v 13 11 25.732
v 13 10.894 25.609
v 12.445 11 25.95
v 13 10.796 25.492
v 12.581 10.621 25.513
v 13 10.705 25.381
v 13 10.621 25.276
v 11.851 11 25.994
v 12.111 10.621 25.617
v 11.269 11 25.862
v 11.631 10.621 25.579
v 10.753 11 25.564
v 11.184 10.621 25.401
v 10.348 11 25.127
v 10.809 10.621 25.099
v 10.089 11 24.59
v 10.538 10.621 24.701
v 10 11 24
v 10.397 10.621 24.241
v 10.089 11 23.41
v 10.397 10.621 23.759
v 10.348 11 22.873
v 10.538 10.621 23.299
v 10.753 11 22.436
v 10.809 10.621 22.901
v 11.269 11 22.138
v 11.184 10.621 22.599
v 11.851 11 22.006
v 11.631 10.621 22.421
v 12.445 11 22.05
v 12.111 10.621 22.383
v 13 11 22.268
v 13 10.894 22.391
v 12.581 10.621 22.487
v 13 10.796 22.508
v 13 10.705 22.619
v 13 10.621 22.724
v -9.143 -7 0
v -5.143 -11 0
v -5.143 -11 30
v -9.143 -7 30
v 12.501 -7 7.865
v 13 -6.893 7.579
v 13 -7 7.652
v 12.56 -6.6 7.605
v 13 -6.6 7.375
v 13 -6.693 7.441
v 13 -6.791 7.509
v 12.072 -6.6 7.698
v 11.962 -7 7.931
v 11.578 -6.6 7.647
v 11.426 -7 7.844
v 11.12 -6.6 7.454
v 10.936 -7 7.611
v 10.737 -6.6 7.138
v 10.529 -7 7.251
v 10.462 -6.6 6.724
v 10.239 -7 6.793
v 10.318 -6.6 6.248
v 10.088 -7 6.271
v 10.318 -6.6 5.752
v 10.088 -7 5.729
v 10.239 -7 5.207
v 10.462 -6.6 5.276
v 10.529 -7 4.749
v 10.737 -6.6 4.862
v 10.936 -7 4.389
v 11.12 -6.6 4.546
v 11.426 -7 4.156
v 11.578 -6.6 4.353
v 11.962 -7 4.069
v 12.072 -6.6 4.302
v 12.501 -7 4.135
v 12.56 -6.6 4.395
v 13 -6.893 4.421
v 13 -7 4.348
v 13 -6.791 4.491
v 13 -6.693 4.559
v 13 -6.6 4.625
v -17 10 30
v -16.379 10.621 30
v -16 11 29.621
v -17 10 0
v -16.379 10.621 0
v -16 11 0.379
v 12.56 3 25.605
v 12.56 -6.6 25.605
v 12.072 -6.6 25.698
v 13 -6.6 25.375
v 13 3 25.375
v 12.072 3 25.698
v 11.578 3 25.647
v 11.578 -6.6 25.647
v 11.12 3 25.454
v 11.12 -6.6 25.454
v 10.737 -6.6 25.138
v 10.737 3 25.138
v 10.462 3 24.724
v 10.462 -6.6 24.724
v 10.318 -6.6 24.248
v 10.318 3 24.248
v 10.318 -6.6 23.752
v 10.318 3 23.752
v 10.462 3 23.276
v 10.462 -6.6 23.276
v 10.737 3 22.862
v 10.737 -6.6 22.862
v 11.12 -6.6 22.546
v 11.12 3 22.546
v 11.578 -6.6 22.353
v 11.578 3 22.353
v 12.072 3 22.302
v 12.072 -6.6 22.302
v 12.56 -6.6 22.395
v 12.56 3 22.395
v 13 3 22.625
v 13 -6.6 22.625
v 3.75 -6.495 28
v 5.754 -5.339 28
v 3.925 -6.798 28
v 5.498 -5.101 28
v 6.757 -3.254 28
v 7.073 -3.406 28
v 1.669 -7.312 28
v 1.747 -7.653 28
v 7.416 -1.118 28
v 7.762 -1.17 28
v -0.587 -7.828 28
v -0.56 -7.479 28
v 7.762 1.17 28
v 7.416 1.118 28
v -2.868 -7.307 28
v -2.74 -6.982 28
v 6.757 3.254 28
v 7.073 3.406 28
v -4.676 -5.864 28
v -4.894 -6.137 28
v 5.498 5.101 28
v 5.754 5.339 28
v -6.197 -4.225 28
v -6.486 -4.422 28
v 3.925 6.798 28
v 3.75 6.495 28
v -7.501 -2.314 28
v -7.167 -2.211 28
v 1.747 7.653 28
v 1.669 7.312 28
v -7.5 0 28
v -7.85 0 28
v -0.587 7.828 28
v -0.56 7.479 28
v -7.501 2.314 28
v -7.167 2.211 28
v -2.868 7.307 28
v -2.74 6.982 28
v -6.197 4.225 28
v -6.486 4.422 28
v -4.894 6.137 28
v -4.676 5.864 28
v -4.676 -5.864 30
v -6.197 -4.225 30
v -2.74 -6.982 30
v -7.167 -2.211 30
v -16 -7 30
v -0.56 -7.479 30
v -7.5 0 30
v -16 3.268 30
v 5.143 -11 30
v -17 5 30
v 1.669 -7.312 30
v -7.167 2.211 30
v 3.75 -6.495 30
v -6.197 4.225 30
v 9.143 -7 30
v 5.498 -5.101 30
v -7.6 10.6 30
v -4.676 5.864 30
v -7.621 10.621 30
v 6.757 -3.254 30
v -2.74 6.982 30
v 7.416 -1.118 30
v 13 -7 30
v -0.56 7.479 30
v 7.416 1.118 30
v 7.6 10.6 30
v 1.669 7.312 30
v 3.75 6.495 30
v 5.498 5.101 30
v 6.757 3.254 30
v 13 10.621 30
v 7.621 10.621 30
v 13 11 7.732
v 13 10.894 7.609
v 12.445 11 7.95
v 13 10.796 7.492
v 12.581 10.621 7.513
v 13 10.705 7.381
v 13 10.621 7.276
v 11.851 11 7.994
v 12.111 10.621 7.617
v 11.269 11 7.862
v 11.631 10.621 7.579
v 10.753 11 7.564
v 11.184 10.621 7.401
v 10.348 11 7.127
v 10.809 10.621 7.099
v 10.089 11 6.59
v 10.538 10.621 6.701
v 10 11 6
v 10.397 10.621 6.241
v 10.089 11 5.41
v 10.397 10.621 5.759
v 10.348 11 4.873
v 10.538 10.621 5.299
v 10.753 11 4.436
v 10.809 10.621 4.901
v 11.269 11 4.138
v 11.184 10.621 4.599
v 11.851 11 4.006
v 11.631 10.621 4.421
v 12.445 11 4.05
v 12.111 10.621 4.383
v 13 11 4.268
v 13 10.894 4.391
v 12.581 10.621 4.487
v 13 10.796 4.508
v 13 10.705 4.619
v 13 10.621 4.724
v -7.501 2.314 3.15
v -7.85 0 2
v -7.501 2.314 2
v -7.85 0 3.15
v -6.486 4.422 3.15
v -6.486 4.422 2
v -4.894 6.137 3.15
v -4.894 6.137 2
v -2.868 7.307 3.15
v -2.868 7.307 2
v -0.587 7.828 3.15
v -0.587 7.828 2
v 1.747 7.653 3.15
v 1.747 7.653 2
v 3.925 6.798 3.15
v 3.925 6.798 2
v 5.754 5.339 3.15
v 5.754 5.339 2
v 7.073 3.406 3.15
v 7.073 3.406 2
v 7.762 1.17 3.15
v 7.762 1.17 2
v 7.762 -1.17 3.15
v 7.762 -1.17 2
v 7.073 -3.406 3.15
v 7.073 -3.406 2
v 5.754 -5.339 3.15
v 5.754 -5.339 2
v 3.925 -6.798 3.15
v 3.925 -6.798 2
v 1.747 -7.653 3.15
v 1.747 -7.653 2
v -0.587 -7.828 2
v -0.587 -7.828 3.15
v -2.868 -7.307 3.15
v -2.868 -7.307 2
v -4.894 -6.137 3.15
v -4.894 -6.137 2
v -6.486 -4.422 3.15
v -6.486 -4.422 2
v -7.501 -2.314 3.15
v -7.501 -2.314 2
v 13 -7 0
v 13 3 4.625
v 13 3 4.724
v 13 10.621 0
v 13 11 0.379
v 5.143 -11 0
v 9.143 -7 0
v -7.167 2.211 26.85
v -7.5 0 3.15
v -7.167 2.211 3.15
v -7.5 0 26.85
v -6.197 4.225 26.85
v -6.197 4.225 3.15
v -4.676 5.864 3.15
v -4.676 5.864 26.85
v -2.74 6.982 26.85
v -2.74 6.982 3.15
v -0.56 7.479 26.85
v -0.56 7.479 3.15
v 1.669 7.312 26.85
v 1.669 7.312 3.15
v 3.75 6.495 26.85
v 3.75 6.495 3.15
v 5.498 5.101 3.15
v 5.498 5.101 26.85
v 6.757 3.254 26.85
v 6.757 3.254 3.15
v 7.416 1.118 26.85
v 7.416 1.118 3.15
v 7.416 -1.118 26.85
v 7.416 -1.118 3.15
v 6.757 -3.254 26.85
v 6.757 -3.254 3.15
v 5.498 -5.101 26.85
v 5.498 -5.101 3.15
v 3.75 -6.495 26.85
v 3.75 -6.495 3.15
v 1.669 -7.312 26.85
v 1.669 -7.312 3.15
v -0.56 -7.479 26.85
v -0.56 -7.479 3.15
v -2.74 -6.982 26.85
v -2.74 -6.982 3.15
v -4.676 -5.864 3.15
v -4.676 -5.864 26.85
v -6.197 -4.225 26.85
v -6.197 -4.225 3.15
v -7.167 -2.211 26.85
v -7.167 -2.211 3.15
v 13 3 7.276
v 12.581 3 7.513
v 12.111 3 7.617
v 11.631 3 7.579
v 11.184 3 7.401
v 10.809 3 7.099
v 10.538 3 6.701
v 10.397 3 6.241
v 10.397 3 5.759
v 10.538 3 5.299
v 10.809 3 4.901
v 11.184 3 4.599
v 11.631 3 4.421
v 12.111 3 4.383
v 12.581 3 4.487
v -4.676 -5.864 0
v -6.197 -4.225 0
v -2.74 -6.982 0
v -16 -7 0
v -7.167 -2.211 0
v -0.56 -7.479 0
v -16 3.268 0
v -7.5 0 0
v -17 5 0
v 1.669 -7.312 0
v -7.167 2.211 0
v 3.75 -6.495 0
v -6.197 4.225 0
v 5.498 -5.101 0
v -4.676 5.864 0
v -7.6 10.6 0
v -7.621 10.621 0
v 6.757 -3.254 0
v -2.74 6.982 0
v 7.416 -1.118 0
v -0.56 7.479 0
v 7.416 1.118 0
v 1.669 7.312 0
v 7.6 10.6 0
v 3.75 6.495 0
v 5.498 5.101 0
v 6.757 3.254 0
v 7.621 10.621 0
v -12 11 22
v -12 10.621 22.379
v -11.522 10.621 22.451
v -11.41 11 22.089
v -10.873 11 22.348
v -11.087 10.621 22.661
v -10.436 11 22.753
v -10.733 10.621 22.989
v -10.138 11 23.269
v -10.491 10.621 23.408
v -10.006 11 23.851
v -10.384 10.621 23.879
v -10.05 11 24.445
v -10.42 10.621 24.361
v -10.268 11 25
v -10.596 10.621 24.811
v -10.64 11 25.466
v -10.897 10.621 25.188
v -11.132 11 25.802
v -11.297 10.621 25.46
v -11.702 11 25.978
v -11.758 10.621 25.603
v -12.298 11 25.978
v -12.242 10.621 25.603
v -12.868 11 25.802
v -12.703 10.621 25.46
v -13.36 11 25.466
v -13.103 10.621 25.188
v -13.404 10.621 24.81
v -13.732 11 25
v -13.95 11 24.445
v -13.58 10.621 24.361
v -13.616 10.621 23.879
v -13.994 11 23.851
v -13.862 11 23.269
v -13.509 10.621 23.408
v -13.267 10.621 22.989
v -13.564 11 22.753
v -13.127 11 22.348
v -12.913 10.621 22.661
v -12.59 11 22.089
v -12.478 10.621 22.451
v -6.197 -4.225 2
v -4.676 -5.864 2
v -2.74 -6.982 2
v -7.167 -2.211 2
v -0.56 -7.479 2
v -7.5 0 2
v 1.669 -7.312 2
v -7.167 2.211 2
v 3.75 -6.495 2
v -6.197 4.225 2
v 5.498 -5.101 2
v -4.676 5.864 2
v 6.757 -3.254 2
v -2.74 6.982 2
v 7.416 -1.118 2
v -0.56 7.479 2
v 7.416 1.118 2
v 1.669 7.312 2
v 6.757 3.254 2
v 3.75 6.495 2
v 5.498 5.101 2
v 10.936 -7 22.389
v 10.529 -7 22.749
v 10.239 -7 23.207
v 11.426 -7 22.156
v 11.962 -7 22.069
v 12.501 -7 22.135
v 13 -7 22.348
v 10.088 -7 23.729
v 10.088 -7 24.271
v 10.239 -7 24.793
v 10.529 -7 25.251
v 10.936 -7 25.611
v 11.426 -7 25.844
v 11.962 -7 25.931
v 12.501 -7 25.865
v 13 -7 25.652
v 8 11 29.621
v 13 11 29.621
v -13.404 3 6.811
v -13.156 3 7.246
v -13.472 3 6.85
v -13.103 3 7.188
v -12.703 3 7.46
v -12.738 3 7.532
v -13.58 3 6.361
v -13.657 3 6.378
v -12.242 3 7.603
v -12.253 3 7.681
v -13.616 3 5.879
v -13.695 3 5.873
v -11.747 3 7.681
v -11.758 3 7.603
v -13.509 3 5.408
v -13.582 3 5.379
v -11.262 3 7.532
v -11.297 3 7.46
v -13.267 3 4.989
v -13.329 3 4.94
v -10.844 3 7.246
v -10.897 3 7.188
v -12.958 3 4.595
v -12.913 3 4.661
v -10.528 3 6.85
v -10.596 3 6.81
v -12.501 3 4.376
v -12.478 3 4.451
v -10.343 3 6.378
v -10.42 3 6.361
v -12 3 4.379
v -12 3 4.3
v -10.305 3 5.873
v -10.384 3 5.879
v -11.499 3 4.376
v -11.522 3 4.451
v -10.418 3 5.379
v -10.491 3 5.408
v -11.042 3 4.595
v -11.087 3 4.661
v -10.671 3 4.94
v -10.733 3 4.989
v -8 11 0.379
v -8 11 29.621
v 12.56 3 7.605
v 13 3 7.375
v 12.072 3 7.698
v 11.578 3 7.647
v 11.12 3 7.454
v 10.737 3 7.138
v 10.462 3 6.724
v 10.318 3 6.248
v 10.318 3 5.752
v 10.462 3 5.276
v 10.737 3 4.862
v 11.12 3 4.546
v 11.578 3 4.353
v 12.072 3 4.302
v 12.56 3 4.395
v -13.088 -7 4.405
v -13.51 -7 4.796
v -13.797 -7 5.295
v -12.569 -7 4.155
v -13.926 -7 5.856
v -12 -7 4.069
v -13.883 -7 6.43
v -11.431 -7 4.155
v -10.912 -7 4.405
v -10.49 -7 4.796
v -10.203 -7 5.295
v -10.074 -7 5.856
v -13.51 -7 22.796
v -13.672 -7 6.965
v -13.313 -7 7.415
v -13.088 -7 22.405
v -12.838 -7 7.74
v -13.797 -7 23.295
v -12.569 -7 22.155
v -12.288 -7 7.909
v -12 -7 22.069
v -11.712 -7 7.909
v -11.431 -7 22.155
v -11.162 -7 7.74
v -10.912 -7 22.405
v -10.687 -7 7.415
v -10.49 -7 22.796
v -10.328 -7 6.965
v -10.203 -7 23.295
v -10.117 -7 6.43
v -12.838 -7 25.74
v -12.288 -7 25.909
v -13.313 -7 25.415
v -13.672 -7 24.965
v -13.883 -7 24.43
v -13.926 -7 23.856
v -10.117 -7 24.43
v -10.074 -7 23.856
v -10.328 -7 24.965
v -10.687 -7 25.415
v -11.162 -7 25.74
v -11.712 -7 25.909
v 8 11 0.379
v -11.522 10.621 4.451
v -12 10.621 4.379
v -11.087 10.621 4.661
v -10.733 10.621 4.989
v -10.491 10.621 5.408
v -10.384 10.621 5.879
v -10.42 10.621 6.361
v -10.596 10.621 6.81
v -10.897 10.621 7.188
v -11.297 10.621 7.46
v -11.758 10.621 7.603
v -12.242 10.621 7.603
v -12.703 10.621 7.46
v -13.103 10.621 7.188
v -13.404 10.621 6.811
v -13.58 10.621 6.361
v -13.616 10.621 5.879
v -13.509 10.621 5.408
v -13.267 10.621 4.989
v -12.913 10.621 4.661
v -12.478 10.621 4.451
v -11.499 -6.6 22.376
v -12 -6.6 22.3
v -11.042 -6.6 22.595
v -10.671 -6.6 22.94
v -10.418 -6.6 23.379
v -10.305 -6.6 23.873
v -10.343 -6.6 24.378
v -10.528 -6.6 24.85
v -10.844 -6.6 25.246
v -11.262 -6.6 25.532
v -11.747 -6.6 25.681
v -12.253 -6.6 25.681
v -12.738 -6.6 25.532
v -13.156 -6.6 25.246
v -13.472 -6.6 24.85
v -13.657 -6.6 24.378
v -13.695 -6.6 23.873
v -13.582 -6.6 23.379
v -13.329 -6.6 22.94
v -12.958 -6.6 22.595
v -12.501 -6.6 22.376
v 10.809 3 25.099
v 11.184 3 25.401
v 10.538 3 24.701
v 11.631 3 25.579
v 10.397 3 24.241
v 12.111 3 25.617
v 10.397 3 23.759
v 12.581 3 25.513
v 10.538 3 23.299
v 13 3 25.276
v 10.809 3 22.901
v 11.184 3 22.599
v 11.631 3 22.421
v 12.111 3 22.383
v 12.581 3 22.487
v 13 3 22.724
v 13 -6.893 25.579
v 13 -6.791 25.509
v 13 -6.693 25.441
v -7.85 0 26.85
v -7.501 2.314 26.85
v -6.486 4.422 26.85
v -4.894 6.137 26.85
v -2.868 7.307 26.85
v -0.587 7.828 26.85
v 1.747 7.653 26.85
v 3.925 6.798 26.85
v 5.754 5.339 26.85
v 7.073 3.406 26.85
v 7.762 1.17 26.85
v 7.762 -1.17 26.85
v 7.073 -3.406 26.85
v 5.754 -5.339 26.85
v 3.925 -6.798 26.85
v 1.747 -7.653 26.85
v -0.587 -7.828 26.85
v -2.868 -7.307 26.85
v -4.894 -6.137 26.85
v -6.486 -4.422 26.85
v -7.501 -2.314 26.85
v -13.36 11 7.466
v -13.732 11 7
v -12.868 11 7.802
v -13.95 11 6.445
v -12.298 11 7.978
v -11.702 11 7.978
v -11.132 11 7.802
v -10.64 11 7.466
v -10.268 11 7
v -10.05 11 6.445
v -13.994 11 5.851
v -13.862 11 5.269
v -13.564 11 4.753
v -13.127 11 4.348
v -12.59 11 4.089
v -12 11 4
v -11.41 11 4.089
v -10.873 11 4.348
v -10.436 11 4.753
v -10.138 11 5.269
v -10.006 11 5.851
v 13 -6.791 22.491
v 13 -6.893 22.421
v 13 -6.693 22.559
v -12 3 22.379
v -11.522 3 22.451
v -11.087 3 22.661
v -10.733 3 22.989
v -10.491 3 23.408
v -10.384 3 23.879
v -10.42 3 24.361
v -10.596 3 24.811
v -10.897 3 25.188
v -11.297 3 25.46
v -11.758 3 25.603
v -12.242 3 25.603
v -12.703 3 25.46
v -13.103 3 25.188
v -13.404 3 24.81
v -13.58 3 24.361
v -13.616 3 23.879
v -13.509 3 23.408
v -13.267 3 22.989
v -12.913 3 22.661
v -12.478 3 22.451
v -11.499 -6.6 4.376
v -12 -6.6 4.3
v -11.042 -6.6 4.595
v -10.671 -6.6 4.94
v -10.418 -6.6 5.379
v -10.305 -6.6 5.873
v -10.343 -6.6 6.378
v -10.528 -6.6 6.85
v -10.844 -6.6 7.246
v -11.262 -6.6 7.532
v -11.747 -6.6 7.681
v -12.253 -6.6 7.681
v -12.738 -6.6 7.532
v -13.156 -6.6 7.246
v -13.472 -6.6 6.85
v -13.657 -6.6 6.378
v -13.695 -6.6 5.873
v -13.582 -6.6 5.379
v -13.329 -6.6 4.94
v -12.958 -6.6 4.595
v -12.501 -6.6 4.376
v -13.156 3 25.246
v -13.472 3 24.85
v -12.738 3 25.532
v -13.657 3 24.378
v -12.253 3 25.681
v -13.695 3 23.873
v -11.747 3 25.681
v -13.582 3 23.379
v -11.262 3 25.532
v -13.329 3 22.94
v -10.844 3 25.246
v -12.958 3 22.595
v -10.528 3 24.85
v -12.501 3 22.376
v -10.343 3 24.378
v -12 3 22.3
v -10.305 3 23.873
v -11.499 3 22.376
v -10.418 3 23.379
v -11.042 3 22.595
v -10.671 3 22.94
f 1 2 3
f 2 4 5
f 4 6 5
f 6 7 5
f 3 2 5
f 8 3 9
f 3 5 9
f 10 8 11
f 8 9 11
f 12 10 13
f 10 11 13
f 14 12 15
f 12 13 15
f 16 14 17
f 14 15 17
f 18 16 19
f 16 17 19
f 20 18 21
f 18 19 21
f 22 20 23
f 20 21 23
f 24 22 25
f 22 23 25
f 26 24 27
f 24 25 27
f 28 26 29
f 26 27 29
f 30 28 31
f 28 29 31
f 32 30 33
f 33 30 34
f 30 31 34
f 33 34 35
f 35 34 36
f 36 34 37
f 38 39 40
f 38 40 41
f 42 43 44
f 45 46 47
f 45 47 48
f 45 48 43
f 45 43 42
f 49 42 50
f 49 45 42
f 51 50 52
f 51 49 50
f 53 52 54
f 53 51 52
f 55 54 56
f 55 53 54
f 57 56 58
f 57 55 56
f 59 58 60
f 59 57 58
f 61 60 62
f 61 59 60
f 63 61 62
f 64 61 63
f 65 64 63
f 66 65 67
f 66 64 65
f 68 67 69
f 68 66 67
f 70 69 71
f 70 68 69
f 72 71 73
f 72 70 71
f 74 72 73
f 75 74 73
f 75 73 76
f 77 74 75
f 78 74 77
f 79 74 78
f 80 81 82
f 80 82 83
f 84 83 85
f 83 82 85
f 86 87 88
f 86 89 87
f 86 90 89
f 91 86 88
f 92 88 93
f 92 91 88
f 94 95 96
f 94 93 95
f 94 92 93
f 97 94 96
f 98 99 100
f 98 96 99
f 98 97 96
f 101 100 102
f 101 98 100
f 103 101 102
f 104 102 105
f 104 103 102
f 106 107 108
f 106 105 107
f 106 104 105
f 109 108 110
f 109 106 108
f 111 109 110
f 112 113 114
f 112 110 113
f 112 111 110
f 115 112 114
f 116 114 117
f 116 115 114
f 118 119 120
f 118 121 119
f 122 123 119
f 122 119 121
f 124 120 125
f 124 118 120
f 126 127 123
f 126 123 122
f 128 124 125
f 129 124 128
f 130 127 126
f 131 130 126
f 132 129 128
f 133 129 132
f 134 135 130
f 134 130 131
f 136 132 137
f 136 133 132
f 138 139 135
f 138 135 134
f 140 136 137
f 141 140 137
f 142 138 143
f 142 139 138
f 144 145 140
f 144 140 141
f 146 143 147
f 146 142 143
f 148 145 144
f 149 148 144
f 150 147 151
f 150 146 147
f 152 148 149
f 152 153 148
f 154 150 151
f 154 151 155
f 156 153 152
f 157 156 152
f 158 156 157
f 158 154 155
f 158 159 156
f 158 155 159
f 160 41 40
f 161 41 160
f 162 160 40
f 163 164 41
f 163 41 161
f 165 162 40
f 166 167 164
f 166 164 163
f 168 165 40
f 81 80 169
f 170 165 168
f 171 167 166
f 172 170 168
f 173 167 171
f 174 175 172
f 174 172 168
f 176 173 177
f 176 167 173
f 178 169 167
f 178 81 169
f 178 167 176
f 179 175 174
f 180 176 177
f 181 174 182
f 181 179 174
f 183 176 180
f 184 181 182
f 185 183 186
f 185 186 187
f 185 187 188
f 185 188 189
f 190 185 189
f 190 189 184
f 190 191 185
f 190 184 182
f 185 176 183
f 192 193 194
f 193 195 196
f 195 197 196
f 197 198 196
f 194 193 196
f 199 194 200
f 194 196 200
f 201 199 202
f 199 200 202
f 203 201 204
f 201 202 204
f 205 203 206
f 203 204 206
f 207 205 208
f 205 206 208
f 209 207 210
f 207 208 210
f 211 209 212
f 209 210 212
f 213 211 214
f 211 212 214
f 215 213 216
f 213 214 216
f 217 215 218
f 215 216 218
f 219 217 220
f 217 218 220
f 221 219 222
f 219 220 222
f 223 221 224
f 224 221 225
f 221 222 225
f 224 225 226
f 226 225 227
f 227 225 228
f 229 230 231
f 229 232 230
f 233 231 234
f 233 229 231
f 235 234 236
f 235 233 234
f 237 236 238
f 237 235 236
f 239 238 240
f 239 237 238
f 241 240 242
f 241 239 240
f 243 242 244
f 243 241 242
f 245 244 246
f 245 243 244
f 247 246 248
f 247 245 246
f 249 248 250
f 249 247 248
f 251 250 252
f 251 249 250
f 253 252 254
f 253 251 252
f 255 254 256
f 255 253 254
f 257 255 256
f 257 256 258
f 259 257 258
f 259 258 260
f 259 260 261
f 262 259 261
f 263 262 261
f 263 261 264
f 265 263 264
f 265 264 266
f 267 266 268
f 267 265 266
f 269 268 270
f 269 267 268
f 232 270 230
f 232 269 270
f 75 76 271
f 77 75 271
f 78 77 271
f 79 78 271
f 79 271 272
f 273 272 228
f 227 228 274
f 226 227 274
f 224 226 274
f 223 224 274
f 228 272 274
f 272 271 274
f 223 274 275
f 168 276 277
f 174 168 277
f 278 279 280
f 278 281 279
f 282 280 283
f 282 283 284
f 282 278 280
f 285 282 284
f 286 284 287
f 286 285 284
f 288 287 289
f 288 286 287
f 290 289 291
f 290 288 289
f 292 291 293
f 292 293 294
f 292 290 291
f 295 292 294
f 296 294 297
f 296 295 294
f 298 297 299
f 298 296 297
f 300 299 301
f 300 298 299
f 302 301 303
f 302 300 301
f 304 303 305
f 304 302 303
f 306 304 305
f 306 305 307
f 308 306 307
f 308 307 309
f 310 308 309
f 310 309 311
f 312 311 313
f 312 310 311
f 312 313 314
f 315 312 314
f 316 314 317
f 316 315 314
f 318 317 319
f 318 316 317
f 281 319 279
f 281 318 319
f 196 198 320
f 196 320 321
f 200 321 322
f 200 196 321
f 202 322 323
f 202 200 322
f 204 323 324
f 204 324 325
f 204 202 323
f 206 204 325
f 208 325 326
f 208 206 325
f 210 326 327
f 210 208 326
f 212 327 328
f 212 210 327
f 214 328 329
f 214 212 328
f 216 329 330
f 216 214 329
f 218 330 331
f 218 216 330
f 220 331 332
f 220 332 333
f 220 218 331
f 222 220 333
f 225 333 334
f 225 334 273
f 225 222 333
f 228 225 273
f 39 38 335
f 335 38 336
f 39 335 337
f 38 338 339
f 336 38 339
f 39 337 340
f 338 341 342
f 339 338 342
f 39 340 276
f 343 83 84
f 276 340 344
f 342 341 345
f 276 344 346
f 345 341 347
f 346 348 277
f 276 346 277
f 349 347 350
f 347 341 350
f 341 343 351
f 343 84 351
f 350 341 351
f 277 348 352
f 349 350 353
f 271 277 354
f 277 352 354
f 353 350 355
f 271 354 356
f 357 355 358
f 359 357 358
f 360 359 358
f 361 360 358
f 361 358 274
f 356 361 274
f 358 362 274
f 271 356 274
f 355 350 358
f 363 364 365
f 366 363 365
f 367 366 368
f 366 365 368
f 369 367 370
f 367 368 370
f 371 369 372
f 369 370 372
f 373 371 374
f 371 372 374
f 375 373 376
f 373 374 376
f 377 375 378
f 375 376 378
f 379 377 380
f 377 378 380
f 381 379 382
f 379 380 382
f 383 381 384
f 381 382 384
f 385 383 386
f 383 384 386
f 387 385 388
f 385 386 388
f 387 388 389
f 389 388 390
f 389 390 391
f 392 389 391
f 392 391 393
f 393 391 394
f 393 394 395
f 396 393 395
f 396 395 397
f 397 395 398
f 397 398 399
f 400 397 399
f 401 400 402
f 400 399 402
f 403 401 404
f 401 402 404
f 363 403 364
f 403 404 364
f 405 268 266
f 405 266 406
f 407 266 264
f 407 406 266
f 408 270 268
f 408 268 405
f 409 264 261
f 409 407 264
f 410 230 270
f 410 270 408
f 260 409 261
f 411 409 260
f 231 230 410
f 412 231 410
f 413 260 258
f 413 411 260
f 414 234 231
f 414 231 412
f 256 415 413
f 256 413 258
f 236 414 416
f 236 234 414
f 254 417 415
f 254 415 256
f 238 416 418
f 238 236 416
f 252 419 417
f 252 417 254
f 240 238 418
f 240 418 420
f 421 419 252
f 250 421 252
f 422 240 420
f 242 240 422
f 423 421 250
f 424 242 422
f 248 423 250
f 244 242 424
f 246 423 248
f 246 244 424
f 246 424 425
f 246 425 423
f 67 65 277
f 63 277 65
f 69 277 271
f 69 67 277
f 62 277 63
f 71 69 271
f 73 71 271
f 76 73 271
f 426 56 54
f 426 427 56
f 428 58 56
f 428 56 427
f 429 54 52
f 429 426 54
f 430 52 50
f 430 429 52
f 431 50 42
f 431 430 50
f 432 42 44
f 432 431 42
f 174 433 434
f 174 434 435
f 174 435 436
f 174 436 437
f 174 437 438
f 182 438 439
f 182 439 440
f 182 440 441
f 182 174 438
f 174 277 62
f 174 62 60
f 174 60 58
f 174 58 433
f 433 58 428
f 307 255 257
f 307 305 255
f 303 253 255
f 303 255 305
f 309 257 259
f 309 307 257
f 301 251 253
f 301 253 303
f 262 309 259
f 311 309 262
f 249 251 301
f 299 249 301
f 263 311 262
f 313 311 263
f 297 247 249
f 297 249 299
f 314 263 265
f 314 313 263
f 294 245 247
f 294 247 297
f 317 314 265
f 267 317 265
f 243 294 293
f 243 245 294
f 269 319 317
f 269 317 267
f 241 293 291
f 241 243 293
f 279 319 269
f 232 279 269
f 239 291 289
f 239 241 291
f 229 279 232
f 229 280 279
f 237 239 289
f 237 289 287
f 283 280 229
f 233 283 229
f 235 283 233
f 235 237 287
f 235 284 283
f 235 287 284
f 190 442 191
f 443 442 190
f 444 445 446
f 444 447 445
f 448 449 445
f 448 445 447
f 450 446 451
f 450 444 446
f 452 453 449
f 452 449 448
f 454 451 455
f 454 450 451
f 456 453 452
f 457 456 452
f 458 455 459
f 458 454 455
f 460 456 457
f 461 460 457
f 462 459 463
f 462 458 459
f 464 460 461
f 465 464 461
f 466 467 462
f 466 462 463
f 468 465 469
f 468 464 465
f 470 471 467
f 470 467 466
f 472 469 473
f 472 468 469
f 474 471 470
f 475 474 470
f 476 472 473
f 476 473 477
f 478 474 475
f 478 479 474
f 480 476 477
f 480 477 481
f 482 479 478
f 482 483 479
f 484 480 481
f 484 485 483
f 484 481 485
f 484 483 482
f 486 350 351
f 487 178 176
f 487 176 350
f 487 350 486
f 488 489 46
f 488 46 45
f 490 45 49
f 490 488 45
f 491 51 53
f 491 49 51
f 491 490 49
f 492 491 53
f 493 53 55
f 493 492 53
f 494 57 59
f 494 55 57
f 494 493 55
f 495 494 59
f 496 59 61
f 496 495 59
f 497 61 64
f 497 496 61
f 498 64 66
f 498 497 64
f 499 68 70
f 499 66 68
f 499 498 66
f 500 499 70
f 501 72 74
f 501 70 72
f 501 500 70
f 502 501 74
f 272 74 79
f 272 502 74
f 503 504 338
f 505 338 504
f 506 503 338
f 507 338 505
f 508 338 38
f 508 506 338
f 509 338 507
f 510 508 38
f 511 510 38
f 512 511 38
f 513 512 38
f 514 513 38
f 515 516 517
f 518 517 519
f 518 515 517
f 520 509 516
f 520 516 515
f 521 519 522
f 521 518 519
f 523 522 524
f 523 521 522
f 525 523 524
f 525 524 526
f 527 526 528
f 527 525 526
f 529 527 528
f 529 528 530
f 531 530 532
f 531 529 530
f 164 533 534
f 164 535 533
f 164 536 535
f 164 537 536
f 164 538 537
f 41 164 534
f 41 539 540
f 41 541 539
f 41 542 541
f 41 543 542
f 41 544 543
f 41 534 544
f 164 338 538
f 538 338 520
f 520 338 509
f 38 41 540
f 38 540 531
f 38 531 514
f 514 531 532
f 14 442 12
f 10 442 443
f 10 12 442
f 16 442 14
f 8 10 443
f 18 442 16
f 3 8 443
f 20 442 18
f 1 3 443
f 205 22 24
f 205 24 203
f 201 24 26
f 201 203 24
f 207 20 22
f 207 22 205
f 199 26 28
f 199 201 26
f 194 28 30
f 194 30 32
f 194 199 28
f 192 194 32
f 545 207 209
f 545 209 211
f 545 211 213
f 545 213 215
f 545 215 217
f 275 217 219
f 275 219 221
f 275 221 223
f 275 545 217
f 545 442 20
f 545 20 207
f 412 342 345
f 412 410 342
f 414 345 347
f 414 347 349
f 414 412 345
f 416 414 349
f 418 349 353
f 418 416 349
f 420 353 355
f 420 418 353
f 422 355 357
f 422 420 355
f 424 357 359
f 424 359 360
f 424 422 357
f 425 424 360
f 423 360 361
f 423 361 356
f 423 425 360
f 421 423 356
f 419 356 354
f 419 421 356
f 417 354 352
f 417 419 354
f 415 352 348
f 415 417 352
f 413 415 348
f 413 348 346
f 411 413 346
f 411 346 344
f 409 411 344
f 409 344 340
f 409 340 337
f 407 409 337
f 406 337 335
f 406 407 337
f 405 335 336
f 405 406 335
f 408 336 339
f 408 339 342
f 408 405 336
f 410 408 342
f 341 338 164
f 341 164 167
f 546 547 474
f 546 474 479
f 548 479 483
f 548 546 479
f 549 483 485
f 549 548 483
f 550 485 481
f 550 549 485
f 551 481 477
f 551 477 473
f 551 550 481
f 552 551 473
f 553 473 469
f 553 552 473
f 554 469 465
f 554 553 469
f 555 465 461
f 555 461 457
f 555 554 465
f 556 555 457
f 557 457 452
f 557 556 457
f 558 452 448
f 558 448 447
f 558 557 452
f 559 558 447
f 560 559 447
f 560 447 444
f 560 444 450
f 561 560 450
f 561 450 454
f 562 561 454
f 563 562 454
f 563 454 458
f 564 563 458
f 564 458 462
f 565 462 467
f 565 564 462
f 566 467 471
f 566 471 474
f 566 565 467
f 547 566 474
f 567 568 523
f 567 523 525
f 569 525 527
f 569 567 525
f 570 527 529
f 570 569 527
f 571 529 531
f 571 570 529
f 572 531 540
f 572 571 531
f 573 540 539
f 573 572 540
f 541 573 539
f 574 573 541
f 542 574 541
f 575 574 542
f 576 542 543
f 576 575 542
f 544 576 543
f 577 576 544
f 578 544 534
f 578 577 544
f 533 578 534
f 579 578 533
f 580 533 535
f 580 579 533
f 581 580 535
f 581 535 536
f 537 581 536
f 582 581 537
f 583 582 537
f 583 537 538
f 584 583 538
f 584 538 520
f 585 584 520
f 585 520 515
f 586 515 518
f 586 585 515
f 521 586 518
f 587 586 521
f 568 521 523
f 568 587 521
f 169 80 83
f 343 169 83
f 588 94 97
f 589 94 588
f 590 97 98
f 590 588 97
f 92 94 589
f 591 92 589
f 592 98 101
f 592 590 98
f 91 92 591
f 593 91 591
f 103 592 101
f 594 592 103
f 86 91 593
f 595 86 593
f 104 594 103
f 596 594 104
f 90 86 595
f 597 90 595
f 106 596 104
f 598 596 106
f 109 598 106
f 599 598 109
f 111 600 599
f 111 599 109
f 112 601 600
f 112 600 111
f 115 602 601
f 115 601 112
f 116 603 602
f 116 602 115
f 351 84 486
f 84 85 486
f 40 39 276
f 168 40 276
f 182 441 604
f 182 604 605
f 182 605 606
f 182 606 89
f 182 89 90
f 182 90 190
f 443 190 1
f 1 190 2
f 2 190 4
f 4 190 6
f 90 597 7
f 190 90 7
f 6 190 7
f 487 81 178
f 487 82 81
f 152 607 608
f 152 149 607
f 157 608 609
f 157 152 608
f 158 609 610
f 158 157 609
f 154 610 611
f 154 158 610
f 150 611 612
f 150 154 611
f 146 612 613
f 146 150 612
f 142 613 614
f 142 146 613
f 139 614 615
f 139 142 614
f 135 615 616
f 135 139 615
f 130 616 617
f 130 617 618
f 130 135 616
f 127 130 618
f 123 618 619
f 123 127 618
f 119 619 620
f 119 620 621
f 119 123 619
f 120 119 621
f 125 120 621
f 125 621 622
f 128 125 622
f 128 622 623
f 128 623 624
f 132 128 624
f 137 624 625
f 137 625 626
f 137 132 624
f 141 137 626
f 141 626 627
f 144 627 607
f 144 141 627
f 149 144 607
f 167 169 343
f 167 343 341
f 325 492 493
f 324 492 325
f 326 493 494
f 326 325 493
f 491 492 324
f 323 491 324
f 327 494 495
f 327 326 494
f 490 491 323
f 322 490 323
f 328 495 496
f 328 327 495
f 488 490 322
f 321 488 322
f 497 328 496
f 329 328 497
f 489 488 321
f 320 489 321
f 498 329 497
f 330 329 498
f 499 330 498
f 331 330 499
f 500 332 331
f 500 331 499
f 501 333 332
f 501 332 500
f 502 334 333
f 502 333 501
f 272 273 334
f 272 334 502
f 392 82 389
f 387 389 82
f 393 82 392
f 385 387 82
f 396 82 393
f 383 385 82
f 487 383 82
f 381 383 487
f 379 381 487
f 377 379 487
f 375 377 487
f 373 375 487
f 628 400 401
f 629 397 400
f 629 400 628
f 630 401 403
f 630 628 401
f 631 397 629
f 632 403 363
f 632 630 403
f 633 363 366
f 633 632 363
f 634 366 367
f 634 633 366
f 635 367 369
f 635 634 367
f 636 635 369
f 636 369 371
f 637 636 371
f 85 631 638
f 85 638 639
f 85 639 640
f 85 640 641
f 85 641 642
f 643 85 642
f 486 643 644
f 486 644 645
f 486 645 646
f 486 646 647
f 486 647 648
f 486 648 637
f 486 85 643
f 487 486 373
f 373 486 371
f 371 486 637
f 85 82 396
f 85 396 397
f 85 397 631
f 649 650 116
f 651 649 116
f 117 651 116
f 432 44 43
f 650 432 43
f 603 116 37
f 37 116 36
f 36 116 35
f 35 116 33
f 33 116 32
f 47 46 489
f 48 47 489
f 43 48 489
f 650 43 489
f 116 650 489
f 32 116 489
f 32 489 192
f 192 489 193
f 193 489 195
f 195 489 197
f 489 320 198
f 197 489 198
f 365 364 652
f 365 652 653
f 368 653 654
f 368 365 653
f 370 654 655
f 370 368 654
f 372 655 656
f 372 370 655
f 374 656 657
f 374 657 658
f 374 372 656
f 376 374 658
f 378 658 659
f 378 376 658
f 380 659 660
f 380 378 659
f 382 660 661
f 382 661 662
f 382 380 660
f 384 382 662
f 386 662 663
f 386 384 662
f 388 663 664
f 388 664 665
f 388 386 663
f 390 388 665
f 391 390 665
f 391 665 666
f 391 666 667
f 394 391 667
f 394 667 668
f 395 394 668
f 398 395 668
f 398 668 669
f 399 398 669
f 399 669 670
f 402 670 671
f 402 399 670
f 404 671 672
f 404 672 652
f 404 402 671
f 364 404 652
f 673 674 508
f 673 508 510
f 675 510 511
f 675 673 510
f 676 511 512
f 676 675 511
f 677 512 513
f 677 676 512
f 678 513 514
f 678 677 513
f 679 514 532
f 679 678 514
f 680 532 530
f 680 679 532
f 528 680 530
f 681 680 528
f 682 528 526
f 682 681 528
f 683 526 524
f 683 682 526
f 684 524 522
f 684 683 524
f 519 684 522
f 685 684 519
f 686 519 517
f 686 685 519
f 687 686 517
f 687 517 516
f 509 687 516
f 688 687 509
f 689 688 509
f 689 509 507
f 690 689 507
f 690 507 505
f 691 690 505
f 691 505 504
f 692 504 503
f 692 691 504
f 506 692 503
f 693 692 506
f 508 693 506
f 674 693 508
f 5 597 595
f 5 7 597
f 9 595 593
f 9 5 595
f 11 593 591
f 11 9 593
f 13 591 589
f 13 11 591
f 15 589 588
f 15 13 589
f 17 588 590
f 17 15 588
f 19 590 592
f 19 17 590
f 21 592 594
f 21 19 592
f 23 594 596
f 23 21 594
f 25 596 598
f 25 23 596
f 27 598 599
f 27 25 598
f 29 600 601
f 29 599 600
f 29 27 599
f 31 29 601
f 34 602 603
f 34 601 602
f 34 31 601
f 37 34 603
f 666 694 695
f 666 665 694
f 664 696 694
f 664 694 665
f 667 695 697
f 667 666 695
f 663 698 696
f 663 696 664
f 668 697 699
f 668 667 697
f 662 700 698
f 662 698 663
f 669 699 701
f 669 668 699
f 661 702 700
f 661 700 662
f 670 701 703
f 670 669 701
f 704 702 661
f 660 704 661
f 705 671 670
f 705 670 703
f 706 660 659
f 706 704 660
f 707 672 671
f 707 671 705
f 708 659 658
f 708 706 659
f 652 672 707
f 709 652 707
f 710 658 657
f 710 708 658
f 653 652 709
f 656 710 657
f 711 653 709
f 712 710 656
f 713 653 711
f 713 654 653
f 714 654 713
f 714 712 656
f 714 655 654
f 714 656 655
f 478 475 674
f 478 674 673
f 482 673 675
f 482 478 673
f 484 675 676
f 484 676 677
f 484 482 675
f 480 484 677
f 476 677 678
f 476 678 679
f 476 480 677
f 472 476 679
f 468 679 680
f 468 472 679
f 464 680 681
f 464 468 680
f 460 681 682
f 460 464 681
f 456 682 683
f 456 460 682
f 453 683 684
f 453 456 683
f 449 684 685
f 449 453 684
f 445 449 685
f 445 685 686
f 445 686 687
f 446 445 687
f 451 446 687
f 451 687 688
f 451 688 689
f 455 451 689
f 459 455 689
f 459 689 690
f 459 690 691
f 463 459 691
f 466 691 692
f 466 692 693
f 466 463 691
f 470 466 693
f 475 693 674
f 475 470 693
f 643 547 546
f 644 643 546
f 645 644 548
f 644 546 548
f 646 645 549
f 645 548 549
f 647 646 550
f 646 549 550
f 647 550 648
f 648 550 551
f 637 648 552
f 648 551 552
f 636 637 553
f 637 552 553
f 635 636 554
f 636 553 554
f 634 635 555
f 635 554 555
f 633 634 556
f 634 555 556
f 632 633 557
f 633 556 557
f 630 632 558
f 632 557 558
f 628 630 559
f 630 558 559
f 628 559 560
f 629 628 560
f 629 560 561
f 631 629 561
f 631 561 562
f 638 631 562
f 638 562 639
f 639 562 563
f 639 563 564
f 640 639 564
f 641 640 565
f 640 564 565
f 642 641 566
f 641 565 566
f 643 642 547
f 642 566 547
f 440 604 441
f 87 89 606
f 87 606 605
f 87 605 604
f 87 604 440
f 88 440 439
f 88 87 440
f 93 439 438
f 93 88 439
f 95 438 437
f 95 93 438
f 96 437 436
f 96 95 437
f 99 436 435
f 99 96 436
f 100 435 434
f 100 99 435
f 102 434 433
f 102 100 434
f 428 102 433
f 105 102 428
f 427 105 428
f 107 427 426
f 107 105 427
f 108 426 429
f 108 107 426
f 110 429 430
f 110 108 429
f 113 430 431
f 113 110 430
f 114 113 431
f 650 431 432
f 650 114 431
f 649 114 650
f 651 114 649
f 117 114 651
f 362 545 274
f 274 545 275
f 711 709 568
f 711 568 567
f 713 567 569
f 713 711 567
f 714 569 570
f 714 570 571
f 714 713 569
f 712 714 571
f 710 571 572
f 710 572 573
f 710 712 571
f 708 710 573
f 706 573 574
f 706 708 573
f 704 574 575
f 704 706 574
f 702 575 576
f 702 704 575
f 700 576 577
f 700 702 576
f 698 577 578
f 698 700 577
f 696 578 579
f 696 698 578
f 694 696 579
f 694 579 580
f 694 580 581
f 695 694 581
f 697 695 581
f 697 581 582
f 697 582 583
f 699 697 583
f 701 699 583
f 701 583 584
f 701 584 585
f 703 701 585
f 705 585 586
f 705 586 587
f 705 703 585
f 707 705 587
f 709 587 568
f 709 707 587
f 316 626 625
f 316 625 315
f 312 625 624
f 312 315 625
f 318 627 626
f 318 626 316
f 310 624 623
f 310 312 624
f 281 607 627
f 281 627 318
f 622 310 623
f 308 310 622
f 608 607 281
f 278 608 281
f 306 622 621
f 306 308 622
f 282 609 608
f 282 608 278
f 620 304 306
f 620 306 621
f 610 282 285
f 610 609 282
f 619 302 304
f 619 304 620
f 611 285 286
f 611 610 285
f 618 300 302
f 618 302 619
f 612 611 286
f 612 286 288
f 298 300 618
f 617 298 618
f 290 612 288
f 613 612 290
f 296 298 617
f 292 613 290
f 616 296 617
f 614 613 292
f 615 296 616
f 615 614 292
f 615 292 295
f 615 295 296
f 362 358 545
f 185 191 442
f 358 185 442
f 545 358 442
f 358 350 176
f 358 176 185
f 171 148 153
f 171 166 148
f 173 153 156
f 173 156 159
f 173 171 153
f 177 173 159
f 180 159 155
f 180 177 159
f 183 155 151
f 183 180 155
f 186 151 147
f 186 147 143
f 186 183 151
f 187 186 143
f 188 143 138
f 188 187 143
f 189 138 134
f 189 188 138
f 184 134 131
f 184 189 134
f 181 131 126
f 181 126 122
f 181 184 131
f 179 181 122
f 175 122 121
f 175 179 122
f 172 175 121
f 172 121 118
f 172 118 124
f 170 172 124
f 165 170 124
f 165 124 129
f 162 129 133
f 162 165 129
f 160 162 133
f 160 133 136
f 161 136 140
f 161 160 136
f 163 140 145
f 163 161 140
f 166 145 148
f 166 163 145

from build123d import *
from OCP.BRepFilletAPI import BRepFilletAPI_MakeChamfer

# Parameters (mm, degrees)
SCHIZZO1_W                   = 34
SCHIZZO1_H                   = 30
ESTRUSIONE_ESTRUSIONE1_DEPTH = 22
SCHIZZO2_W                   = 1
SCHIZZO2_H                   = 14.267949192
TAGLIO_ESTRUSIONE1_DEPTH     = 37.193922142
SCHIZZO3_W                   = 10.8571
SCHIZZO3_H                   = 4
TAGLIO_ESTRUSIONE2_DEPTH     = 37.193922142
SCHIZZO4_W                   = 11.8571
SCHIZZO4_H                   = 4
TAGLIO_ESTRUSIONE3_DEPTH     = 37.193922142
SCHIZZO5_W                   = 1
SCHIZZO5_H                   = 10.267949192
TAGLIO_ESTRUSIONE4_DEPTH     = 37.193922142
SCHIZZO6_W                   = 15.2
SCHIZZO6_H                   = 0.4
TAGLIO_ESTRUSIONE5_DEPTH     = 37.193922142
SFORMO1_ANGLE                = 60
SFORMO2_ANGLE                = 60
SFORMO3_ANGLE                = 45
SFORMO4_ANGLE                = 45
SMUSSO1_SIZE                 = 0.230940108
SMUSSO1_SIZE2                = 0.4
SMUSSO2_SIZE                 = 0.379
SMUSSO3_SIZE                 = 1
SCHIZZO13_W                  = 7.577824215
SCHIZZO13_H                  = 21.931685432
TAGLIO_ESTRUSIONE6_DEPTH     = 37.193922142


with BuildPart() as part:
    # Schizzo1 → Estrusione-Estrusione1 (new body)
    with BuildSketch(Plane(origin=(0, 11, 0), x_dir=(1, 0, 0), z_dir=(0, 1, 0))):
        with Locations((0, -15)):
            Rectangle(SCHIZZO1_W, SCHIZZO1_H)
    extrude(amount=-ESTRUSIONE_ESTRUSIONE1_DEPTH)

    # Schizzo2 → Taglio-Estrusione1 (cut, through all)
    with BuildSketch(Plane.XY.offset(30)):
        with Locations((16.5, -3.866025404)):
            Rectangle(SCHIZZO2_W, SCHIZZO2_H)
    extrude(amount=-TAGLIO_ESTRUSIONE1_DEPTH, mode=Mode.SUBTRACT)

    # Schizzo3 → Taglio-Estrusione2 (cut, through all)
    with BuildSketch(Plane.XY.offset(30)):
        with Locations((10.57145, -9)):
            Rectangle(SCHIZZO3_W, SCHIZZO3_H)
    extrude(amount=-TAGLIO_ESTRUSIONE2_DEPTH, mode=Mode.SUBTRACT)

    # Schizzo4 → Taglio-Estrusione3 (cut, through all)
    with BuildSketch(Plane.XY.offset(30)):
        with Locations((-11.07145, -9)):
            Rectangle(SCHIZZO4_W, SCHIZZO4_H)
    extrude(amount=-TAGLIO_ESTRUSIONE3_DEPTH, mode=Mode.SUBTRACT)

    # Schizzo5 → Taglio-Estrusione4 (cut, through all)
    with BuildSketch(Plane.XY.offset(30)):
        with Locations((-16.5, -1.866025404)):
            Rectangle(SCHIZZO5_W, SCHIZZO5_H)
    extrude(amount=-TAGLIO_ESTRUSIONE4_DEPTH, mode=Mode.SUBTRACT)

    # Schizzo6 → Taglio-Estrusione5 (cut, through all)
    with BuildSketch(Plane.XY.offset(30)):
        with Locations((0, 10.8)):
            Rectangle(SCHIZZO6_W, SCHIZZO6_H)
    extrude(amount=-TAGLIO_ESTRUSIONE5_DEPTH, mode=Mode.SUBTRACT)

    # Sformo1
    sformo1_faces = [part.faces().sort_by_distance(p)[0] for p in [
        (16.5, 3.267949192, 15),
    ]]
    draft(sformo1_faces, Plane(origin=(16, 3.267949192, 0), x_dir=(0, 0, 1), z_dir=(1, 0, 0)), SFORMO1_ANGLE)

    # Sformo2
    sformo2_faces = [part.faces().sort_by_distance(p)[0] for p in [
        (-16.5, 3.267949192, 15),
    ]]
    draft(sformo2_faces, Plane(origin=(-16, -7, 0), x_dir=(0, 0, -1), z_dir=(-1, 0, 0)), SFORMO2_ANGLE)

    # Sformo3
    sformo3_faces = [part.faces().sort_by_distance(p)[0] for p in [
        (5.1429, -9, 15),
        (-5.1429, -9, 15),
    ]]
    draft(sformo3_faces, Plane(origin=(0, -11, 0), x_dir=(0, 0, -1), z_dir=(0, -1, 0)), SFORMO3_ANGLE)

    # Sformo4
    sformo4_faces = [part.faces().sort_by_distance(p)[0] for p in [
        (-7.6, 10.8, 15),
        (7.6, 10.8, 15),
    ]]
    draft(sformo4_faces, Plane(origin=(-7.6, 10.6, 0), x_dir=(1, 0, 0), z_dir=(0, 1, 0)), SFORMO4_ANGLE)

    # Schizzo7 → Taglia-Rivoluzione1 (revolve, cut)
    with BuildSketch(Plane.XZ, mode=Mode.PRIVATE) as taglia_rivoluzione1_sk:
        Polygon((7.5, 30), (0, 30), (0, 0), (7.5, 0), (7.5, 2), (7.85, 2), (7.85, 3.15), (7.5, 3.15), (7.5, 26.85), (7.85, 26.85), (7.85, 28), (7.5, 28), align=None)
    revolve(taglia_rivoluzione1_sk.sketch.rotate(Axis((0, 0, 30), (0, 0, -1)), 180), axis=Axis((0, 0, 30), (0, 0, -1)), mode=Mode.SUBTRACT)

    # Schizzo8 → Taglia-Rivoluzione2 (revolve, cut)
    with BuildSketch(Plane.XY.offset(6), mode=Mode.PRIVATE) as taglia_rivoluzione2_sk:
        Polygon((-10.379, 11), (-12, 11), (-12, -7), (-10.3, -7), (-10.3, 3), (-10.379, 3), align=None)
    revolve(taglia_rivoluzione2_sk.sketch.rotate(Axis((-12, 11, 6), (0, -1, 0)), 270), axis=Axis((-12, 11, 6), (0, -1, 0)), mode=Mode.SUBTRACT)

    # Schizzo9 → Taglia-Rivoluzione3 (revolve, cut)
    with BuildSketch(Plane.XY.offset(24), mode=Mode.PRIVATE) as taglia_rivoluzione3_sk:
        Polygon((-10.379, 11), (-12, 11), (-12, -7), (-10.3, -7), (-10.3, 3), (-10.379, 3), align=None)
    revolve(taglia_rivoluzione3_sk.sketch.rotate(Axis((-12, 11, 24), (0, -1, 0)), 270), axis=Axis((-12, 11, 24), (0, -1, 0)), mode=Mode.SUBTRACT)

    # Schizzo10 → Taglia-Rivoluzione4 (revolve, cut)
    with BuildSketch(Plane.XY.offset(6), mode=Mode.PRIVATE) as taglia_rivoluzione4_sk:
        Polygon((13.621, 11), (12, 11), (12, -7), (13.7, -7), (13.7, 3), (13.621, 3), align=None)
    revolve(taglia_rivoluzione4_sk.sketch.rotate(Axis((12, 11, 6), (0, -1, 0)), 270), axis=Axis((12, 11, 6), (0, -1, 0)), mode=Mode.SUBTRACT)

    # Schizzo11 → Taglia-Rivoluzione5 (revolve, cut)
    with BuildSketch(Plane.XY.offset(24), mode=Mode.PRIVATE) as taglia_rivoluzione5_sk:
        Polygon((13.621, 11), (12, 11), (12, -7), (13.7, -7), (13.7, 3), (13.621, 3), align=None)
    revolve(taglia_rivoluzione5_sk.sketch.rotate(Axis((12, 11, 24), (0, -1, 0)), 270), axis=Axis((12, 11, 24), (0, -1, 0)), mode=Mode.SUBTRACT)

    # Smusso1: one chamfer whose edges measure the first distance from different faces: ONE call of the kernel's chamfer builder (chamfer() names one face for all edges)
    smusso1_edges_1 = [part.edges().sort_by_distance(p)[0] for p in [
        (-12, -7, 7.7),
        (-12, -7, 25.7),
    ]]
    smusso1_side_1 = [part.faces().sort_by_distance(p)[0] for p in [
        (-12.626775869, -7, 15),
    ]]
    smusso1_edges_2 = [part.edges().sort_by_distance(p)[0] for p in [
        (12, -7, 7.7),
        (12, -7, 25.7),
    ]]
    smusso1_side_2 = [part.faces().sort_by_distance(p)[0] for p in [
        (12.626775869, -7, 15),
    ]]
    smusso1 = BRepFilletAPI_MakeChamfer(part.part.solid().wrapped)
    for e in smusso1_edges_1:
        smusso1.Add(SMUSSO1_SIZE, SMUSSO1_SIZE2, e.wrapped, smusso1_side_1[0].wrapped)  # the first distance lies on this face
    for e in smusso1_edges_2:
        smusso1.Add(SMUSSO1_SIZE, SMUSSO1_SIZE2, e.wrapped, smusso1_side_2[0].wrapped)  # the first distance lies on this face
    add(Compound.cast(smusso1.Shape()), mode=Mode.REPLACE)

    # Smusso2
    smusso2_edges = [part.edges().sort_by_distance(p)[0] for p in [
        (-12, 11, 7.621),
        (-12, 11, 25.621),
        (12, 11, 7.621),
        (12, 11, 25.621),
        (-12.5, 11, 30),
        (12.5, 11, 0),
        (-12.5, 11, 0),
        (12.5, 11, 30),
    ]]
    chamfer(smusso2_edges, length=SMUSSO2_SIZE)

    # Smusso3
    smusso3_edges = [part.edges().sort_by_distance(p)[0] for p in [
        (17, 11, 15),
        (-17, 11, 15),
    ]]
    chamfer(smusso3_edges, length=SMUSSO3_SIZE)

    # Schizzo13 → Taglio-Estrusione6 (cut, through all)
    with BuildSketch(Plane(origin=(0, 0, 0), x_dir=(-1, 0, 0), z_dir=(0, 0, -1))):
        with Locations((-16.788912107, 1.791699595)):
            Rectangle(SCHIZZO13_W, SCHIZZO13_H)
    extrude(amount=-TAGLIO_ESTRUSIONE6_DEPTH, mode=Mode.SUBTRACT)


solid = part.part
